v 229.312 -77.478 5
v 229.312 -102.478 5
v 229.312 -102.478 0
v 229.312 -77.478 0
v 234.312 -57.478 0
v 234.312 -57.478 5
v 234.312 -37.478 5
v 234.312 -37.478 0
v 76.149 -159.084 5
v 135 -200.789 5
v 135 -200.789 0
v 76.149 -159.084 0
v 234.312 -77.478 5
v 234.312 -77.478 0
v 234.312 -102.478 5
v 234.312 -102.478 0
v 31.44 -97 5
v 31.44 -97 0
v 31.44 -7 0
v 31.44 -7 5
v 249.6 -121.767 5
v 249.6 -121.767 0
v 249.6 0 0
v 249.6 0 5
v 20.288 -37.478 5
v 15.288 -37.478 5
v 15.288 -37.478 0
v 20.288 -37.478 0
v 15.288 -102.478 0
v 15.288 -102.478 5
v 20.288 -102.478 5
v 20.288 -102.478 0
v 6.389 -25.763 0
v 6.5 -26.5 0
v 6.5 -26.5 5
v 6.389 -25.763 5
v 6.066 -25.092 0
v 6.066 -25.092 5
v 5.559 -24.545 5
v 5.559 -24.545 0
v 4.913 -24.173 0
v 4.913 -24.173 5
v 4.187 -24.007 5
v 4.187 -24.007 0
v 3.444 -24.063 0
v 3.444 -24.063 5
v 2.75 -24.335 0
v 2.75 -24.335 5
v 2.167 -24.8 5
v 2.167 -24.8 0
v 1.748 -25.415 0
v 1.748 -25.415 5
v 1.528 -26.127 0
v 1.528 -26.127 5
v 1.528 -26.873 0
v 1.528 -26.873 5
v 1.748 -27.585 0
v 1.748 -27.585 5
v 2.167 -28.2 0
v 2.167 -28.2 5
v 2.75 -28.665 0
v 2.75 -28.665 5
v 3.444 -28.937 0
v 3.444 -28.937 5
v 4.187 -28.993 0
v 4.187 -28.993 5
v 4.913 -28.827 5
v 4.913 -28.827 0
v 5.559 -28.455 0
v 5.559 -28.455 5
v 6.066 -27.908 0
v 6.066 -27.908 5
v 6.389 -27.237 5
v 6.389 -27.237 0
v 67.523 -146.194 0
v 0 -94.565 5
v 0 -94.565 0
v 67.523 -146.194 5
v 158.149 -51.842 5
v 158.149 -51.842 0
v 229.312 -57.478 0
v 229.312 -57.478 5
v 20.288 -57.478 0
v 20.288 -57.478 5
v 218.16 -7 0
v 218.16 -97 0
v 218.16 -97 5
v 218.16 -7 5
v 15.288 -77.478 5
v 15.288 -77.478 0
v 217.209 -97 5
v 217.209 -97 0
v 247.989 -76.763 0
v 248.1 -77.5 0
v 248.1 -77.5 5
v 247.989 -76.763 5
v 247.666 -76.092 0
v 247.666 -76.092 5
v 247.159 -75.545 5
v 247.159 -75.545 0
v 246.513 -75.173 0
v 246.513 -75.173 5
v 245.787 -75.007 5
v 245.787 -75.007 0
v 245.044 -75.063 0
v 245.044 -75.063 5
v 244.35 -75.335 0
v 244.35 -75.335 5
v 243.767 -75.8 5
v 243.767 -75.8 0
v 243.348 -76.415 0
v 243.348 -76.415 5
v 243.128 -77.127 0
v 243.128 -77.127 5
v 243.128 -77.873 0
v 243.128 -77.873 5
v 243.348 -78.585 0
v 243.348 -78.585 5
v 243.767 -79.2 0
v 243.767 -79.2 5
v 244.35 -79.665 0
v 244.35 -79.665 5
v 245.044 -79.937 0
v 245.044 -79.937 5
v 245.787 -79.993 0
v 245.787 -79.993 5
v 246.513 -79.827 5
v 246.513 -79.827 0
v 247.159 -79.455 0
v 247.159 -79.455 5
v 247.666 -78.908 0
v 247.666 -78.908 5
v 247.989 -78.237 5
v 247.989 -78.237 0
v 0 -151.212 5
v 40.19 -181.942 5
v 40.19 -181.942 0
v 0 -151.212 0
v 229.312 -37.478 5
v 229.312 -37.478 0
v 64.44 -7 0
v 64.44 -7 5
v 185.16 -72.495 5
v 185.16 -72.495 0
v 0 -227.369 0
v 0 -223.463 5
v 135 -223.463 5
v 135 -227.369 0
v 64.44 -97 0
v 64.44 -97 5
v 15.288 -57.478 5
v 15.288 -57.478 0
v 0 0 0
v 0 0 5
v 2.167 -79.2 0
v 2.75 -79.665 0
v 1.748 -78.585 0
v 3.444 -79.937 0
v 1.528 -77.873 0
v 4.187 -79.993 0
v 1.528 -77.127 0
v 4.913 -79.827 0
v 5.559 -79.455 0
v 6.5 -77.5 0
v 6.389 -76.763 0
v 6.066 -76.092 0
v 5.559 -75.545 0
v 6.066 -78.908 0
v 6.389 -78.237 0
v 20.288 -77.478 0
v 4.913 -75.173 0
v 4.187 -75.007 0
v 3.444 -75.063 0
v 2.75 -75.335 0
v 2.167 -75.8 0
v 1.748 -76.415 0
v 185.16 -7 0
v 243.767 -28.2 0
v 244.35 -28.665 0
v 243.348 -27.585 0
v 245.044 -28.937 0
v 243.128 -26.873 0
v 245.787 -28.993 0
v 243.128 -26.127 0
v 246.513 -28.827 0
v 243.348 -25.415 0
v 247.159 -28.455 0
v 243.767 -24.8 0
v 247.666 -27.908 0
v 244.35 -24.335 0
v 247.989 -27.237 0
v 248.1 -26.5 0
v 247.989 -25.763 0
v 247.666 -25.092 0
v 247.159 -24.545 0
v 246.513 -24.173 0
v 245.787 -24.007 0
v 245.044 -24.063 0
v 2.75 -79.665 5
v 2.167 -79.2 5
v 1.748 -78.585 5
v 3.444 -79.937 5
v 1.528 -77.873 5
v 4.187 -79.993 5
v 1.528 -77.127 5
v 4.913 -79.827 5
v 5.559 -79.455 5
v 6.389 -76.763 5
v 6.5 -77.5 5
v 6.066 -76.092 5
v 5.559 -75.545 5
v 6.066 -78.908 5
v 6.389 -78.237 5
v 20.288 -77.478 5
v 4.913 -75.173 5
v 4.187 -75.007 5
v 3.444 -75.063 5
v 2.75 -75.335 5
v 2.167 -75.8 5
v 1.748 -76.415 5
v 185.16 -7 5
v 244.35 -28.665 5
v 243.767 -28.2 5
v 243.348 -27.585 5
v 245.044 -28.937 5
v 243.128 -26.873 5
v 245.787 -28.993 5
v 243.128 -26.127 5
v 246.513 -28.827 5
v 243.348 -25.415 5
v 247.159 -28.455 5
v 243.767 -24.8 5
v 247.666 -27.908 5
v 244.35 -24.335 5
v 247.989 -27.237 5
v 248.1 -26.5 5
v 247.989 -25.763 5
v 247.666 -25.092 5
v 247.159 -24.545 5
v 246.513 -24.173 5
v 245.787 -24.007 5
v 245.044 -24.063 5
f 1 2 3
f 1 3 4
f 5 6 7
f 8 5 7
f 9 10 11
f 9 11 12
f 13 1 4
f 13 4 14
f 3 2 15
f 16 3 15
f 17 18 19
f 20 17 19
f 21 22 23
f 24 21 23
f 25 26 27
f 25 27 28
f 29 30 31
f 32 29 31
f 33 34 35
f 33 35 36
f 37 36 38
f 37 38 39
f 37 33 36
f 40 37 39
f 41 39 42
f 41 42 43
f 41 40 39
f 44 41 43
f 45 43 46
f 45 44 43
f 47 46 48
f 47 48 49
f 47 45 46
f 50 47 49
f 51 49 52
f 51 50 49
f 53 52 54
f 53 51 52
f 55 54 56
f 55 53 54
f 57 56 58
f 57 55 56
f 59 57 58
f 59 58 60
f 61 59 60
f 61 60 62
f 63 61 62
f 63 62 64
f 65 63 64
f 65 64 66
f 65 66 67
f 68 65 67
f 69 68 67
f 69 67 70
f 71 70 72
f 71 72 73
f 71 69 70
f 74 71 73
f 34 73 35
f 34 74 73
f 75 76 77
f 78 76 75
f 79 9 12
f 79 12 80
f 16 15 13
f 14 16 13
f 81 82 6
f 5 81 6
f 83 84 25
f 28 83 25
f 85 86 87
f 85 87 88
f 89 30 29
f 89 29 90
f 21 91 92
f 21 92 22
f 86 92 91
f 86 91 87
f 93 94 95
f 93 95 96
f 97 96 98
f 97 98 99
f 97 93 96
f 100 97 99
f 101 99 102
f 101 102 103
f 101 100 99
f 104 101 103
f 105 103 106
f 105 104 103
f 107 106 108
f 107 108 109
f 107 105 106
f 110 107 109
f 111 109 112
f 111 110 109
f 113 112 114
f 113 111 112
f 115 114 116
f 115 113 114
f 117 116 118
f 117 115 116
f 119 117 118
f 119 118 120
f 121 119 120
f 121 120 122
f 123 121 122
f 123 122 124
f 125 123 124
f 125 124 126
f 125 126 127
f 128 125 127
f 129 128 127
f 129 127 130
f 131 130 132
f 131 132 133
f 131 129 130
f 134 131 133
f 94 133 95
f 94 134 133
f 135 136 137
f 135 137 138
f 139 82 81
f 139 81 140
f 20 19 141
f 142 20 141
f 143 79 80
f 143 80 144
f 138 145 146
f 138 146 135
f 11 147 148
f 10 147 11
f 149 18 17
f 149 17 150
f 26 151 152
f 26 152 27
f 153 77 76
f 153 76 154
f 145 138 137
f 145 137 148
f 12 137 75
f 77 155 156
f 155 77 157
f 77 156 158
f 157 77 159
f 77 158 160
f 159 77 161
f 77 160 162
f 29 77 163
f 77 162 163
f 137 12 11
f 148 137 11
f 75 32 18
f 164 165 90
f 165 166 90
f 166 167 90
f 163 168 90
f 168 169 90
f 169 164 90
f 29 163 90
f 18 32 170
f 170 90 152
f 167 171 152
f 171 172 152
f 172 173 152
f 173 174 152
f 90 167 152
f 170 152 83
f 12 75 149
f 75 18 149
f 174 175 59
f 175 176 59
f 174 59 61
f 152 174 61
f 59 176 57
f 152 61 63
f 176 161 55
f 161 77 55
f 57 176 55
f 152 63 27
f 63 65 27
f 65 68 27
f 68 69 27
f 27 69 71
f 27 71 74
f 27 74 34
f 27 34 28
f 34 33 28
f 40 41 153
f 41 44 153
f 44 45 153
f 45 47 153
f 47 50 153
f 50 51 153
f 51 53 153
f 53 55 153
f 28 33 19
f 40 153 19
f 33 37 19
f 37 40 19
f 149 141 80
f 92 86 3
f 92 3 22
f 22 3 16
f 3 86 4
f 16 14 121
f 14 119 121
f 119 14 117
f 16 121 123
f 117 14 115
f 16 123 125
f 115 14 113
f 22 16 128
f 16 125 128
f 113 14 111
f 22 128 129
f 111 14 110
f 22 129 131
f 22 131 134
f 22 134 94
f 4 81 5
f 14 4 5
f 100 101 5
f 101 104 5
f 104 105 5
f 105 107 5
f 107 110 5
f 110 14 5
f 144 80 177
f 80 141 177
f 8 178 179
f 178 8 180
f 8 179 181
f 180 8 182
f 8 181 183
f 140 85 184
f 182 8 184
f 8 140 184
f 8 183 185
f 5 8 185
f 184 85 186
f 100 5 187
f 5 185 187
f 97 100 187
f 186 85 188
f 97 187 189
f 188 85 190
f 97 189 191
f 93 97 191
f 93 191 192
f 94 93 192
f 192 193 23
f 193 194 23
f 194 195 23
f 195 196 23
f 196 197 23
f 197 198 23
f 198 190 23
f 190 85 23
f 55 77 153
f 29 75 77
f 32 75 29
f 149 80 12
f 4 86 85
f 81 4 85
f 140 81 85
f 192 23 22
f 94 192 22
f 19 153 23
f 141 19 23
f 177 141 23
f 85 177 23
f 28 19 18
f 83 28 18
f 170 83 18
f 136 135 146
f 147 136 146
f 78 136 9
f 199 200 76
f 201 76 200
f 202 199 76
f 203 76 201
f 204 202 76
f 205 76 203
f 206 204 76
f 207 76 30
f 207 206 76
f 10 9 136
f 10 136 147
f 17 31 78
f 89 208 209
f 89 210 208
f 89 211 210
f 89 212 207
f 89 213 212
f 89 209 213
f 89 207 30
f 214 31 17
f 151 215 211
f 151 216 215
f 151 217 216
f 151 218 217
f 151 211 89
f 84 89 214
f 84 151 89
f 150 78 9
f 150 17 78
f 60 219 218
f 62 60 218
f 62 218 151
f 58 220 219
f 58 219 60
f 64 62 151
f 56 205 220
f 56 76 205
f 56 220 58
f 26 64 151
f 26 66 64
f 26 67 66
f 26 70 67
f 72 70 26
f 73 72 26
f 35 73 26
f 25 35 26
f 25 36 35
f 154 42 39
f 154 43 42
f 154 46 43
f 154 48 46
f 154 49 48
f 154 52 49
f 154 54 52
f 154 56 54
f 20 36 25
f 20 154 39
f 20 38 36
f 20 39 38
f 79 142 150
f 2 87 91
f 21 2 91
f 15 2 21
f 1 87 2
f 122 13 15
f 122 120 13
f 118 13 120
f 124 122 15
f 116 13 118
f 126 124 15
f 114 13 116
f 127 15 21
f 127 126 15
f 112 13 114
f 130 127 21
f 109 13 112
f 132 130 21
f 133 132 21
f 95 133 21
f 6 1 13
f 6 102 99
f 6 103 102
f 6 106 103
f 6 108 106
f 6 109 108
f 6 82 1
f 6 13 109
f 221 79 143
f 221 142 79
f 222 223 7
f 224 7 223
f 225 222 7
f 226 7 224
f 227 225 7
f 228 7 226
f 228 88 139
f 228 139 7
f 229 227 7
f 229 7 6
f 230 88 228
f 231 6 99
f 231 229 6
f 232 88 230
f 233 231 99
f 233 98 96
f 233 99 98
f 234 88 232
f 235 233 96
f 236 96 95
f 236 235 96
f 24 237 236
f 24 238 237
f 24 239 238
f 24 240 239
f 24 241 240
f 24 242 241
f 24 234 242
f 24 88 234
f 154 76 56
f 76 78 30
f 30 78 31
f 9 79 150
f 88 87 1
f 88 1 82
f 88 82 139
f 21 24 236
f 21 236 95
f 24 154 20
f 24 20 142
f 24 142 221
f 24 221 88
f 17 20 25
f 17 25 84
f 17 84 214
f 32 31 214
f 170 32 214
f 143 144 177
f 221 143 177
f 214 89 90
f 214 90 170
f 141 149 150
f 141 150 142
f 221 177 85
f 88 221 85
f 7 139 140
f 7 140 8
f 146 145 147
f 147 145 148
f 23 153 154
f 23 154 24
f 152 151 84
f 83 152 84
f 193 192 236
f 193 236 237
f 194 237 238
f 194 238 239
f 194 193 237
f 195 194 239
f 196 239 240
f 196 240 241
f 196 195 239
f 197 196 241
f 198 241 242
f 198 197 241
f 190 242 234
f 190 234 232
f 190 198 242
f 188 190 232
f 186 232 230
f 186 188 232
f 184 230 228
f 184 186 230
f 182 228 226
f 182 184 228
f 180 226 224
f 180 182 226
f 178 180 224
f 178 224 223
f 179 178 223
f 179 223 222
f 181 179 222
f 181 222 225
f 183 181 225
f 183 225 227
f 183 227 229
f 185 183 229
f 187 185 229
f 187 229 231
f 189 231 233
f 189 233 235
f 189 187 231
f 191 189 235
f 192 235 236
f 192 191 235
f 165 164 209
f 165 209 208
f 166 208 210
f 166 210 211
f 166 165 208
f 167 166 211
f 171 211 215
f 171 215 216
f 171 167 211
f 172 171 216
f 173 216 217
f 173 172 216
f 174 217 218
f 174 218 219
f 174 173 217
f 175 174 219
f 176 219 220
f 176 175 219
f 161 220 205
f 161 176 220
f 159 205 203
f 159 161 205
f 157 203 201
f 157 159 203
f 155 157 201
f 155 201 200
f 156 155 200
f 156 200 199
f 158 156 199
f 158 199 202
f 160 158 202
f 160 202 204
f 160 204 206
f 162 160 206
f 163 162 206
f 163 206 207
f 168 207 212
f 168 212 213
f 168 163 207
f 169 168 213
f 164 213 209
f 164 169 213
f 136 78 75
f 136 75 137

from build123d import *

# Parameters (mm, degrees)
SKETCH1_W           = 249.6
SKETCH1_H           = 284.42
SKETCH1_R           = 2.5
SKETCH1_W_2         = 33
SKETCH1_H_2         = 90
BOSS_EXTRUDE1_DEPTH = 5
SKETCH4_W           = 135
SKETCH4_H           = 244.46665057
CUT_EXTRUDE2_DEPTH  = 49.034766894
CUT_EXTRUDE3_DEPTH  = 6
CUT_EXTRUDE4_DEPTH  = 6
SKETCH7_W           = 5
SKETCH7_H           = 20
SKETCH7_H_2         = 25
CUT_EXTRUDE5_DEPTH  = 6


with BuildPart() as part:
    # Sketch1 → Boss-Extrude1 (new body)
    with BuildSketch(Plane.XY):
        with Locations((124.8, -142.21)):
            Rectangle(SKETCH1_W, SKETCH1_H)
        with Locations((245.6, -26.5)):
            Circle(SKETCH1_R, mode=Mode.SUBTRACT)
        with Locations((245.6, -77.5)):
            Circle(SKETCH1_R, mode=Mode.SUBTRACT)
        with Locations((4, -77.5)):
            Circle(SKETCH1_R, mode=Mode.SUBTRACT)
        with Locations((4, -26.5)):
            Circle(SKETCH1_R, mode=Mode.SUBTRACT)
        with Locations((201.66, -52)):
            Rectangle(SKETCH1_W_2, SKETCH1_H_2, mode=Mode.SUBTRACT)
        with Locations((47.94, -52)):
            Rectangle(SKETCH1_W_2, SKETCH1_H_2, mode=Mode.SUBTRACT)
    extrude(amount=BOSS_EXTRUDE1_DEPTH)

    # Sketch4 → Cut-Extrude2 (cut, through all)
    with BuildSketch(Plane(origin=(0, -141.18753923, 110.307795042), x_dir=(1, 0, 0), z_dir=(0, 0.788010754, -0.615661475))):
        with Locations((67.5, 84.166930672)):
            Rectangle(SKETCH4_W, SKETCH4_H)
    extrude(amount=-CUT_EXTRUDE2_DEPTH, mode=Mode.SUBTRACT)

    # Sketch5 → Cut-Extrude3 (cut, through all)
    with BuildSketch(Plane.XY.offset(5)):
        Polygon((76.149175745, -159.084342324), (158.149444505, -51.841832454), (328.08312673, -181.777318211), (207.31876811, -339.716714228), (135, -284.42), (135, -200.788988557), align=None)
    extrude(amount=-CUT_EXTRUDE3_DEPTH, mode=Mode.SUBTRACT)

    # Sketch6 → Cut-Extrude4 (cut, through all)
    with BuildSketch(Plane.XY.offset(5)):
        Polygon((0, -94.564658056), (67.52306177, -146.194456905), (40.18963885, -181.941960195), (-27.33342292, -130.312161346), align=None)
    extrude(amount=-CUT_EXTRUDE4_DEPTH, mode=Mode.SUBTRACT)

    # Sketch7 → Cut-Extrude5 (cut, through all)
    with BuildSketch(Plane.XY.offset(5)):
        with Locations((17.788155616, -47.477871486)):
            Rectangle(SKETCH7_W, SKETCH7_H)
        with Locations((231.811844384, -47.477871486)):
            Rectangle(SKETCH7_W, SKETCH7_H)
        with Locations((17.788155616, -89.977871486)):
            Rectangle(SKETCH7_W, SKETCH7_H_2)
        with Locations((231.811844384, -89.977871486)):
            Rectangle(SKETCH7_W, SKETCH7_H_2)
    extrude(amount=-CUT_EXTRUDE5_DEPTH, mode=Mode.SUBTRACT)


solid = part.part
